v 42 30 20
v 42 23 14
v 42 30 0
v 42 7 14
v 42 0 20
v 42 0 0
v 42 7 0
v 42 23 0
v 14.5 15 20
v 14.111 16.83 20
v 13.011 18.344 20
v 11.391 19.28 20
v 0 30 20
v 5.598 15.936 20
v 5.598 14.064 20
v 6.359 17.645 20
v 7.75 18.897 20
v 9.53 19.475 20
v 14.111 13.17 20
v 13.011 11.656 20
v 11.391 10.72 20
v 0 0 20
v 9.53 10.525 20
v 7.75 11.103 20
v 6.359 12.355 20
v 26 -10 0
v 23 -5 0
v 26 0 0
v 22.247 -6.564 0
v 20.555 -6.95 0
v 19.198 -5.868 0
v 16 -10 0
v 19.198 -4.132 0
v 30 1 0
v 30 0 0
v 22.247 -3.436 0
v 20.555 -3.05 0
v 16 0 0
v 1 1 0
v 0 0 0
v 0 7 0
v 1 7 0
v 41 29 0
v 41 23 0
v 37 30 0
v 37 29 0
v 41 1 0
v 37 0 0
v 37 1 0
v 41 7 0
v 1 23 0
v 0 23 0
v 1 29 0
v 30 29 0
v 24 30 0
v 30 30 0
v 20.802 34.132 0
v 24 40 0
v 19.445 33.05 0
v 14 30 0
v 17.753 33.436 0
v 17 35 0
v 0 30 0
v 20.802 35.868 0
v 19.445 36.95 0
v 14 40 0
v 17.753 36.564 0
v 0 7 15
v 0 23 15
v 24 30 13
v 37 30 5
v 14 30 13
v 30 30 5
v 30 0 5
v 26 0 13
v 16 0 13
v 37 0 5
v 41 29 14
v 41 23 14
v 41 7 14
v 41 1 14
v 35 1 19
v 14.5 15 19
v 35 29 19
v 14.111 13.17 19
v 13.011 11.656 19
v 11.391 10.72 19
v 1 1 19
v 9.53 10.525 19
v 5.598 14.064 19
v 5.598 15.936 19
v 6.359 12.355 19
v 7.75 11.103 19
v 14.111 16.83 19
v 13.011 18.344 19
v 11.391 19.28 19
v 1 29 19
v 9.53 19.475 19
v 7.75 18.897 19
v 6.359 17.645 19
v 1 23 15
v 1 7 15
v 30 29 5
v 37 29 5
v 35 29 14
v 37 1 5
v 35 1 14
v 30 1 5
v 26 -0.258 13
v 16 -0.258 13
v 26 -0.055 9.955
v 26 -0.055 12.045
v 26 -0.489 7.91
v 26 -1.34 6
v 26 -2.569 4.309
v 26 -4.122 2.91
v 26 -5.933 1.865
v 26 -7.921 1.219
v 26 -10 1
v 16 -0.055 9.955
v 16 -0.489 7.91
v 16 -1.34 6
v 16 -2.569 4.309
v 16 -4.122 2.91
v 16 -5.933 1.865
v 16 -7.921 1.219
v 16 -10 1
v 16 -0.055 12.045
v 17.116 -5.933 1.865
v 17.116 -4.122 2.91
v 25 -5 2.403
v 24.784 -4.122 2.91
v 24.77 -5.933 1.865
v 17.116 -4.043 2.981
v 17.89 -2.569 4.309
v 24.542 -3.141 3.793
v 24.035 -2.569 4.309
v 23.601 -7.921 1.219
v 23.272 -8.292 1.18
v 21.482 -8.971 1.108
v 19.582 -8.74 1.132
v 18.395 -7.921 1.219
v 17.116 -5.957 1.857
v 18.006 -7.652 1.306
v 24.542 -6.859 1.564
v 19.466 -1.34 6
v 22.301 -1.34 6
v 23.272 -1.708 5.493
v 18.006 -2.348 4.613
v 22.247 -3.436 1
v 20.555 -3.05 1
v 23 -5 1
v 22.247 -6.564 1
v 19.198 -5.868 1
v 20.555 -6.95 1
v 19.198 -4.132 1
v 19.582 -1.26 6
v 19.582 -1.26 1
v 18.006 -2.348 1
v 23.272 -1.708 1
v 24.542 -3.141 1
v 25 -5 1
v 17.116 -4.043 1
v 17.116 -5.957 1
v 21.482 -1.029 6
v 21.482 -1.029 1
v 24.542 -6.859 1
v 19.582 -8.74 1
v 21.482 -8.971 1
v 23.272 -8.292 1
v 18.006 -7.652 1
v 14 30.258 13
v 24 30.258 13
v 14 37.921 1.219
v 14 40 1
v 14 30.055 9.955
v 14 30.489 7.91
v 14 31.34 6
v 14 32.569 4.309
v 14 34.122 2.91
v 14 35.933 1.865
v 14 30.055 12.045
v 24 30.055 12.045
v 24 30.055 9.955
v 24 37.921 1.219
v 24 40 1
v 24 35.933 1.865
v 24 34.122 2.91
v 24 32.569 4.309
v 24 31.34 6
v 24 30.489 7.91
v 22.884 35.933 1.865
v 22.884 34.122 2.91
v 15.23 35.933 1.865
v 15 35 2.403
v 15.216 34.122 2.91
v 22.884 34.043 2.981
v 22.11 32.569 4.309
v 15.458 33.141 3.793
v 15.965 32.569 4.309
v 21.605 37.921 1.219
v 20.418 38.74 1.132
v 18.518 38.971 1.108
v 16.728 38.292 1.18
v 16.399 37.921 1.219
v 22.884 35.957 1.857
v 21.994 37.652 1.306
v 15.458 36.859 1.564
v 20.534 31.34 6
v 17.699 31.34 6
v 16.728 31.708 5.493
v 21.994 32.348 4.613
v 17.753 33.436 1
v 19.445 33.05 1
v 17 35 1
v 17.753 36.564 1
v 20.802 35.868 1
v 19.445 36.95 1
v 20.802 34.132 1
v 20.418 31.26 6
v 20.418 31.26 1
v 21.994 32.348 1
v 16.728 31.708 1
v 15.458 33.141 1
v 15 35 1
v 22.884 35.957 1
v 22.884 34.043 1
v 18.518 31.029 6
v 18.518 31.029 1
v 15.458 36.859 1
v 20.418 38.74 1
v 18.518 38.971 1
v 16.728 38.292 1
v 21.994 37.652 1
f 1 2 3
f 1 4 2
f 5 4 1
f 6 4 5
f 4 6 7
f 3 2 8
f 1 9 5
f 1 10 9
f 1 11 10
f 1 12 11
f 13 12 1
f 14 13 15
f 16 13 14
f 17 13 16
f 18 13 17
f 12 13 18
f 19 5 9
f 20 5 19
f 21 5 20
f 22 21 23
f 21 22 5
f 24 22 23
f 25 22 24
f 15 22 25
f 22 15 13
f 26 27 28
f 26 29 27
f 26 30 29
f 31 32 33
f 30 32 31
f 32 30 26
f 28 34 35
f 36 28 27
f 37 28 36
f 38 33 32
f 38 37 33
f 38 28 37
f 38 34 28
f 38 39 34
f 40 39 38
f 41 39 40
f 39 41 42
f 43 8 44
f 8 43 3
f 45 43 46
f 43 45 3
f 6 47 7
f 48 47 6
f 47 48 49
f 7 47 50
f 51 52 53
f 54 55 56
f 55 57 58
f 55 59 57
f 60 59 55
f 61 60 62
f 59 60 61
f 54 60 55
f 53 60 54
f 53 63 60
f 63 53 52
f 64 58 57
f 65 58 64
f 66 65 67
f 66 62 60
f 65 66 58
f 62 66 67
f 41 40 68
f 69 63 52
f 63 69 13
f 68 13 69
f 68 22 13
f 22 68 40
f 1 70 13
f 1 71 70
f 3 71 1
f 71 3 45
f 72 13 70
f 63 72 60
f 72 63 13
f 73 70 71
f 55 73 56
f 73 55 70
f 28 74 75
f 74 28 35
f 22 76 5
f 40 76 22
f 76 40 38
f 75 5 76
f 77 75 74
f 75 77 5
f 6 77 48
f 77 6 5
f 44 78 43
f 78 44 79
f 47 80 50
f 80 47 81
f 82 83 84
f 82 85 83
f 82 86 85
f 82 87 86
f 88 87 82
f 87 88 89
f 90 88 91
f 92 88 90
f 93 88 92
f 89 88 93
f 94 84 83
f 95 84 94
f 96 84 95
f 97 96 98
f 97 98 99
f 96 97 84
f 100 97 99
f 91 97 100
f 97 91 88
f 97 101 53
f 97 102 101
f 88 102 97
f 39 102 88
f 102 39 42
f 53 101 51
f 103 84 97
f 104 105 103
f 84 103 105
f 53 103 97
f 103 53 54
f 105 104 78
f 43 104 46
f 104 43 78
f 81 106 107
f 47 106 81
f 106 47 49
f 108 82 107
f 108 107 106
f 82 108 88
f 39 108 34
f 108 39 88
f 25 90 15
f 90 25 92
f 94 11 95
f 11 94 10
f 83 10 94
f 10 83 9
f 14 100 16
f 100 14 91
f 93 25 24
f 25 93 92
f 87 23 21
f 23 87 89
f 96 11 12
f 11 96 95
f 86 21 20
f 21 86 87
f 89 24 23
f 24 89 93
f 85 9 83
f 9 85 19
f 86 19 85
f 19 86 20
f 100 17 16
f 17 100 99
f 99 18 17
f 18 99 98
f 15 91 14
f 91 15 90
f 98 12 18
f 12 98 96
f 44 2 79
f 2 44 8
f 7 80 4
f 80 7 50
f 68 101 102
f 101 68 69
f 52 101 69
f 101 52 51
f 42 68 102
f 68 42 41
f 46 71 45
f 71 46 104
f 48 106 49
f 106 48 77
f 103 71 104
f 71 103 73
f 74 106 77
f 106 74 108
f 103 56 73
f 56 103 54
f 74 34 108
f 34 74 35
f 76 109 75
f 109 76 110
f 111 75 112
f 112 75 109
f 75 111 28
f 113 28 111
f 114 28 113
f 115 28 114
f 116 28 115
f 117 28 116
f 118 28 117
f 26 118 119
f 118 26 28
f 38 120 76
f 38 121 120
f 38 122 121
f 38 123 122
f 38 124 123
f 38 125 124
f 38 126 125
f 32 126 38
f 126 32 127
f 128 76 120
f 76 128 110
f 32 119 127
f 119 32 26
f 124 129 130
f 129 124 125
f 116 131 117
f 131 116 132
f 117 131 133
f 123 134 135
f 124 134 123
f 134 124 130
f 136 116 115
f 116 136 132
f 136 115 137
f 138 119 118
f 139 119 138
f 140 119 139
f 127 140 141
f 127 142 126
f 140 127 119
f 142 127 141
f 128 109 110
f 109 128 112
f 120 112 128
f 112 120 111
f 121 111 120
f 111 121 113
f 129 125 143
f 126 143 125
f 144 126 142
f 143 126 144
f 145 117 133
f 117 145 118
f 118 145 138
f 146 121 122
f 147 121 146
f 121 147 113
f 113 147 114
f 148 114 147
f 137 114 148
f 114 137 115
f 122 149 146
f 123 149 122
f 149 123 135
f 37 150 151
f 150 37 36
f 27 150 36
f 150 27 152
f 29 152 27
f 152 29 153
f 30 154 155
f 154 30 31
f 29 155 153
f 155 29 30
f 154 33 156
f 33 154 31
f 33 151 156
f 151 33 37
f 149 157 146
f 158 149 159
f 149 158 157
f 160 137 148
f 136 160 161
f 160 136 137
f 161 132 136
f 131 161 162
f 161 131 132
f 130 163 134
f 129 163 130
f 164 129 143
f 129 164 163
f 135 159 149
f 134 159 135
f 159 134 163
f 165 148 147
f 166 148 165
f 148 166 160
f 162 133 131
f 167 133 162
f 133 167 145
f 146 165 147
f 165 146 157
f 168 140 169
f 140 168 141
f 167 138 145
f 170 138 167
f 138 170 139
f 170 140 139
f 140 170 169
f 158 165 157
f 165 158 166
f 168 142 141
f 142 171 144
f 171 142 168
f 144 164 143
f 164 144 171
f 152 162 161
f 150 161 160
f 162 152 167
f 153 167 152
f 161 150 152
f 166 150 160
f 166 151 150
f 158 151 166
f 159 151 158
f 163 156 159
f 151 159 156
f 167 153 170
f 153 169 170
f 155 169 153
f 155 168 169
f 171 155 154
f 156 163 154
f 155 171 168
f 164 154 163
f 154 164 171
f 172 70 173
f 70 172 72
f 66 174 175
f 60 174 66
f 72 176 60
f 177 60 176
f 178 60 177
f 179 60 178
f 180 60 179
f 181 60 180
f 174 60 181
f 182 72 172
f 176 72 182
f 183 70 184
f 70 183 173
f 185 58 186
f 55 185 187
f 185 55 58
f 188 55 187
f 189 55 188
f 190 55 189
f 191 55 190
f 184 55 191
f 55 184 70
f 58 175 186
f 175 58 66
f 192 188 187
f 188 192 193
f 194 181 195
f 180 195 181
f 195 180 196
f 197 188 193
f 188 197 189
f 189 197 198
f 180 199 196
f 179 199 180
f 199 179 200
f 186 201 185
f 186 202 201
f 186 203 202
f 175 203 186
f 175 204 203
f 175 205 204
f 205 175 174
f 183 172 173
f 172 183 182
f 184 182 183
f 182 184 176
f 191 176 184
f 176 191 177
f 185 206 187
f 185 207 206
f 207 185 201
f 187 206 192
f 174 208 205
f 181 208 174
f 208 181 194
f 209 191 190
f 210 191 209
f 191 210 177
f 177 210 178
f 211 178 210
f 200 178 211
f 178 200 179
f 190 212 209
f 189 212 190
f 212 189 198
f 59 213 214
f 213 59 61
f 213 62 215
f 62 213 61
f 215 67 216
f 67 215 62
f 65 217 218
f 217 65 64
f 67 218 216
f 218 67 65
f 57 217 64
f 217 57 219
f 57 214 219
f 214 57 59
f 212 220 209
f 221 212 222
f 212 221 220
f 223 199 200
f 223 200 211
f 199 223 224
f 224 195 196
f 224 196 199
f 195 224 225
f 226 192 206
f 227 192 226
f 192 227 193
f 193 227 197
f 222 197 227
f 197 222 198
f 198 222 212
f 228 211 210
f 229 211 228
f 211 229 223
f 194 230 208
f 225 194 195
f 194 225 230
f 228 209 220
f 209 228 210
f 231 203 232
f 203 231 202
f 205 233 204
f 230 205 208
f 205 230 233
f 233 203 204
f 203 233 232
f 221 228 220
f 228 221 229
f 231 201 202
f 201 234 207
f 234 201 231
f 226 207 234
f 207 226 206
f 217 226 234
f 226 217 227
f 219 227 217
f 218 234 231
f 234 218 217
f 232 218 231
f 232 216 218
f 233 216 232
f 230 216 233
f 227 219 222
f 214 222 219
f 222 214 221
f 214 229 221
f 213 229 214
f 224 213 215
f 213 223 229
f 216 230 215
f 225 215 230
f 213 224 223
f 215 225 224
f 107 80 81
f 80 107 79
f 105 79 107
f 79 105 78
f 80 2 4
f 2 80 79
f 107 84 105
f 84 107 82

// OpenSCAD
module screw(){
    difference(){
        hull(){
            translate([16,-10,0]){
                cube([10,10,2]);
            }
            translate([16,-1,0]){
                cube([10,1,13]);
            }
        }
        translate([16,-10,11]){
            rotate([0,90,0]){
                cylinder(10,10,10);
            }
        }
        translate([21,-5,0]){
            cylinder(5,2,2);
        }
        translate([21,-5,1]){
            cylinder(5,4,4);
        }
    }
}



union(){
    difference(){
        cube([42,30,20]);
        translate([1,1,0]){
            cube([40,28,19]);
        }
        translate([10,15,0]){
            cylinder(25,4.5,4.5);
        }
        translate([40,7,0]){
            cube([2,16,15]);
        }
        translate([0,7,0]){
            cube([2,16,15]);
        }
        translate([30,0,0]){
            cube([7,30,5]);
        }
    }
   
    translate([35,0,14]){
        cube([7,30,5]);
    }
    screw();
    translate([40,30,0]){
        rotate([0,0,180]){
            screw();
        }
    }
    
}
